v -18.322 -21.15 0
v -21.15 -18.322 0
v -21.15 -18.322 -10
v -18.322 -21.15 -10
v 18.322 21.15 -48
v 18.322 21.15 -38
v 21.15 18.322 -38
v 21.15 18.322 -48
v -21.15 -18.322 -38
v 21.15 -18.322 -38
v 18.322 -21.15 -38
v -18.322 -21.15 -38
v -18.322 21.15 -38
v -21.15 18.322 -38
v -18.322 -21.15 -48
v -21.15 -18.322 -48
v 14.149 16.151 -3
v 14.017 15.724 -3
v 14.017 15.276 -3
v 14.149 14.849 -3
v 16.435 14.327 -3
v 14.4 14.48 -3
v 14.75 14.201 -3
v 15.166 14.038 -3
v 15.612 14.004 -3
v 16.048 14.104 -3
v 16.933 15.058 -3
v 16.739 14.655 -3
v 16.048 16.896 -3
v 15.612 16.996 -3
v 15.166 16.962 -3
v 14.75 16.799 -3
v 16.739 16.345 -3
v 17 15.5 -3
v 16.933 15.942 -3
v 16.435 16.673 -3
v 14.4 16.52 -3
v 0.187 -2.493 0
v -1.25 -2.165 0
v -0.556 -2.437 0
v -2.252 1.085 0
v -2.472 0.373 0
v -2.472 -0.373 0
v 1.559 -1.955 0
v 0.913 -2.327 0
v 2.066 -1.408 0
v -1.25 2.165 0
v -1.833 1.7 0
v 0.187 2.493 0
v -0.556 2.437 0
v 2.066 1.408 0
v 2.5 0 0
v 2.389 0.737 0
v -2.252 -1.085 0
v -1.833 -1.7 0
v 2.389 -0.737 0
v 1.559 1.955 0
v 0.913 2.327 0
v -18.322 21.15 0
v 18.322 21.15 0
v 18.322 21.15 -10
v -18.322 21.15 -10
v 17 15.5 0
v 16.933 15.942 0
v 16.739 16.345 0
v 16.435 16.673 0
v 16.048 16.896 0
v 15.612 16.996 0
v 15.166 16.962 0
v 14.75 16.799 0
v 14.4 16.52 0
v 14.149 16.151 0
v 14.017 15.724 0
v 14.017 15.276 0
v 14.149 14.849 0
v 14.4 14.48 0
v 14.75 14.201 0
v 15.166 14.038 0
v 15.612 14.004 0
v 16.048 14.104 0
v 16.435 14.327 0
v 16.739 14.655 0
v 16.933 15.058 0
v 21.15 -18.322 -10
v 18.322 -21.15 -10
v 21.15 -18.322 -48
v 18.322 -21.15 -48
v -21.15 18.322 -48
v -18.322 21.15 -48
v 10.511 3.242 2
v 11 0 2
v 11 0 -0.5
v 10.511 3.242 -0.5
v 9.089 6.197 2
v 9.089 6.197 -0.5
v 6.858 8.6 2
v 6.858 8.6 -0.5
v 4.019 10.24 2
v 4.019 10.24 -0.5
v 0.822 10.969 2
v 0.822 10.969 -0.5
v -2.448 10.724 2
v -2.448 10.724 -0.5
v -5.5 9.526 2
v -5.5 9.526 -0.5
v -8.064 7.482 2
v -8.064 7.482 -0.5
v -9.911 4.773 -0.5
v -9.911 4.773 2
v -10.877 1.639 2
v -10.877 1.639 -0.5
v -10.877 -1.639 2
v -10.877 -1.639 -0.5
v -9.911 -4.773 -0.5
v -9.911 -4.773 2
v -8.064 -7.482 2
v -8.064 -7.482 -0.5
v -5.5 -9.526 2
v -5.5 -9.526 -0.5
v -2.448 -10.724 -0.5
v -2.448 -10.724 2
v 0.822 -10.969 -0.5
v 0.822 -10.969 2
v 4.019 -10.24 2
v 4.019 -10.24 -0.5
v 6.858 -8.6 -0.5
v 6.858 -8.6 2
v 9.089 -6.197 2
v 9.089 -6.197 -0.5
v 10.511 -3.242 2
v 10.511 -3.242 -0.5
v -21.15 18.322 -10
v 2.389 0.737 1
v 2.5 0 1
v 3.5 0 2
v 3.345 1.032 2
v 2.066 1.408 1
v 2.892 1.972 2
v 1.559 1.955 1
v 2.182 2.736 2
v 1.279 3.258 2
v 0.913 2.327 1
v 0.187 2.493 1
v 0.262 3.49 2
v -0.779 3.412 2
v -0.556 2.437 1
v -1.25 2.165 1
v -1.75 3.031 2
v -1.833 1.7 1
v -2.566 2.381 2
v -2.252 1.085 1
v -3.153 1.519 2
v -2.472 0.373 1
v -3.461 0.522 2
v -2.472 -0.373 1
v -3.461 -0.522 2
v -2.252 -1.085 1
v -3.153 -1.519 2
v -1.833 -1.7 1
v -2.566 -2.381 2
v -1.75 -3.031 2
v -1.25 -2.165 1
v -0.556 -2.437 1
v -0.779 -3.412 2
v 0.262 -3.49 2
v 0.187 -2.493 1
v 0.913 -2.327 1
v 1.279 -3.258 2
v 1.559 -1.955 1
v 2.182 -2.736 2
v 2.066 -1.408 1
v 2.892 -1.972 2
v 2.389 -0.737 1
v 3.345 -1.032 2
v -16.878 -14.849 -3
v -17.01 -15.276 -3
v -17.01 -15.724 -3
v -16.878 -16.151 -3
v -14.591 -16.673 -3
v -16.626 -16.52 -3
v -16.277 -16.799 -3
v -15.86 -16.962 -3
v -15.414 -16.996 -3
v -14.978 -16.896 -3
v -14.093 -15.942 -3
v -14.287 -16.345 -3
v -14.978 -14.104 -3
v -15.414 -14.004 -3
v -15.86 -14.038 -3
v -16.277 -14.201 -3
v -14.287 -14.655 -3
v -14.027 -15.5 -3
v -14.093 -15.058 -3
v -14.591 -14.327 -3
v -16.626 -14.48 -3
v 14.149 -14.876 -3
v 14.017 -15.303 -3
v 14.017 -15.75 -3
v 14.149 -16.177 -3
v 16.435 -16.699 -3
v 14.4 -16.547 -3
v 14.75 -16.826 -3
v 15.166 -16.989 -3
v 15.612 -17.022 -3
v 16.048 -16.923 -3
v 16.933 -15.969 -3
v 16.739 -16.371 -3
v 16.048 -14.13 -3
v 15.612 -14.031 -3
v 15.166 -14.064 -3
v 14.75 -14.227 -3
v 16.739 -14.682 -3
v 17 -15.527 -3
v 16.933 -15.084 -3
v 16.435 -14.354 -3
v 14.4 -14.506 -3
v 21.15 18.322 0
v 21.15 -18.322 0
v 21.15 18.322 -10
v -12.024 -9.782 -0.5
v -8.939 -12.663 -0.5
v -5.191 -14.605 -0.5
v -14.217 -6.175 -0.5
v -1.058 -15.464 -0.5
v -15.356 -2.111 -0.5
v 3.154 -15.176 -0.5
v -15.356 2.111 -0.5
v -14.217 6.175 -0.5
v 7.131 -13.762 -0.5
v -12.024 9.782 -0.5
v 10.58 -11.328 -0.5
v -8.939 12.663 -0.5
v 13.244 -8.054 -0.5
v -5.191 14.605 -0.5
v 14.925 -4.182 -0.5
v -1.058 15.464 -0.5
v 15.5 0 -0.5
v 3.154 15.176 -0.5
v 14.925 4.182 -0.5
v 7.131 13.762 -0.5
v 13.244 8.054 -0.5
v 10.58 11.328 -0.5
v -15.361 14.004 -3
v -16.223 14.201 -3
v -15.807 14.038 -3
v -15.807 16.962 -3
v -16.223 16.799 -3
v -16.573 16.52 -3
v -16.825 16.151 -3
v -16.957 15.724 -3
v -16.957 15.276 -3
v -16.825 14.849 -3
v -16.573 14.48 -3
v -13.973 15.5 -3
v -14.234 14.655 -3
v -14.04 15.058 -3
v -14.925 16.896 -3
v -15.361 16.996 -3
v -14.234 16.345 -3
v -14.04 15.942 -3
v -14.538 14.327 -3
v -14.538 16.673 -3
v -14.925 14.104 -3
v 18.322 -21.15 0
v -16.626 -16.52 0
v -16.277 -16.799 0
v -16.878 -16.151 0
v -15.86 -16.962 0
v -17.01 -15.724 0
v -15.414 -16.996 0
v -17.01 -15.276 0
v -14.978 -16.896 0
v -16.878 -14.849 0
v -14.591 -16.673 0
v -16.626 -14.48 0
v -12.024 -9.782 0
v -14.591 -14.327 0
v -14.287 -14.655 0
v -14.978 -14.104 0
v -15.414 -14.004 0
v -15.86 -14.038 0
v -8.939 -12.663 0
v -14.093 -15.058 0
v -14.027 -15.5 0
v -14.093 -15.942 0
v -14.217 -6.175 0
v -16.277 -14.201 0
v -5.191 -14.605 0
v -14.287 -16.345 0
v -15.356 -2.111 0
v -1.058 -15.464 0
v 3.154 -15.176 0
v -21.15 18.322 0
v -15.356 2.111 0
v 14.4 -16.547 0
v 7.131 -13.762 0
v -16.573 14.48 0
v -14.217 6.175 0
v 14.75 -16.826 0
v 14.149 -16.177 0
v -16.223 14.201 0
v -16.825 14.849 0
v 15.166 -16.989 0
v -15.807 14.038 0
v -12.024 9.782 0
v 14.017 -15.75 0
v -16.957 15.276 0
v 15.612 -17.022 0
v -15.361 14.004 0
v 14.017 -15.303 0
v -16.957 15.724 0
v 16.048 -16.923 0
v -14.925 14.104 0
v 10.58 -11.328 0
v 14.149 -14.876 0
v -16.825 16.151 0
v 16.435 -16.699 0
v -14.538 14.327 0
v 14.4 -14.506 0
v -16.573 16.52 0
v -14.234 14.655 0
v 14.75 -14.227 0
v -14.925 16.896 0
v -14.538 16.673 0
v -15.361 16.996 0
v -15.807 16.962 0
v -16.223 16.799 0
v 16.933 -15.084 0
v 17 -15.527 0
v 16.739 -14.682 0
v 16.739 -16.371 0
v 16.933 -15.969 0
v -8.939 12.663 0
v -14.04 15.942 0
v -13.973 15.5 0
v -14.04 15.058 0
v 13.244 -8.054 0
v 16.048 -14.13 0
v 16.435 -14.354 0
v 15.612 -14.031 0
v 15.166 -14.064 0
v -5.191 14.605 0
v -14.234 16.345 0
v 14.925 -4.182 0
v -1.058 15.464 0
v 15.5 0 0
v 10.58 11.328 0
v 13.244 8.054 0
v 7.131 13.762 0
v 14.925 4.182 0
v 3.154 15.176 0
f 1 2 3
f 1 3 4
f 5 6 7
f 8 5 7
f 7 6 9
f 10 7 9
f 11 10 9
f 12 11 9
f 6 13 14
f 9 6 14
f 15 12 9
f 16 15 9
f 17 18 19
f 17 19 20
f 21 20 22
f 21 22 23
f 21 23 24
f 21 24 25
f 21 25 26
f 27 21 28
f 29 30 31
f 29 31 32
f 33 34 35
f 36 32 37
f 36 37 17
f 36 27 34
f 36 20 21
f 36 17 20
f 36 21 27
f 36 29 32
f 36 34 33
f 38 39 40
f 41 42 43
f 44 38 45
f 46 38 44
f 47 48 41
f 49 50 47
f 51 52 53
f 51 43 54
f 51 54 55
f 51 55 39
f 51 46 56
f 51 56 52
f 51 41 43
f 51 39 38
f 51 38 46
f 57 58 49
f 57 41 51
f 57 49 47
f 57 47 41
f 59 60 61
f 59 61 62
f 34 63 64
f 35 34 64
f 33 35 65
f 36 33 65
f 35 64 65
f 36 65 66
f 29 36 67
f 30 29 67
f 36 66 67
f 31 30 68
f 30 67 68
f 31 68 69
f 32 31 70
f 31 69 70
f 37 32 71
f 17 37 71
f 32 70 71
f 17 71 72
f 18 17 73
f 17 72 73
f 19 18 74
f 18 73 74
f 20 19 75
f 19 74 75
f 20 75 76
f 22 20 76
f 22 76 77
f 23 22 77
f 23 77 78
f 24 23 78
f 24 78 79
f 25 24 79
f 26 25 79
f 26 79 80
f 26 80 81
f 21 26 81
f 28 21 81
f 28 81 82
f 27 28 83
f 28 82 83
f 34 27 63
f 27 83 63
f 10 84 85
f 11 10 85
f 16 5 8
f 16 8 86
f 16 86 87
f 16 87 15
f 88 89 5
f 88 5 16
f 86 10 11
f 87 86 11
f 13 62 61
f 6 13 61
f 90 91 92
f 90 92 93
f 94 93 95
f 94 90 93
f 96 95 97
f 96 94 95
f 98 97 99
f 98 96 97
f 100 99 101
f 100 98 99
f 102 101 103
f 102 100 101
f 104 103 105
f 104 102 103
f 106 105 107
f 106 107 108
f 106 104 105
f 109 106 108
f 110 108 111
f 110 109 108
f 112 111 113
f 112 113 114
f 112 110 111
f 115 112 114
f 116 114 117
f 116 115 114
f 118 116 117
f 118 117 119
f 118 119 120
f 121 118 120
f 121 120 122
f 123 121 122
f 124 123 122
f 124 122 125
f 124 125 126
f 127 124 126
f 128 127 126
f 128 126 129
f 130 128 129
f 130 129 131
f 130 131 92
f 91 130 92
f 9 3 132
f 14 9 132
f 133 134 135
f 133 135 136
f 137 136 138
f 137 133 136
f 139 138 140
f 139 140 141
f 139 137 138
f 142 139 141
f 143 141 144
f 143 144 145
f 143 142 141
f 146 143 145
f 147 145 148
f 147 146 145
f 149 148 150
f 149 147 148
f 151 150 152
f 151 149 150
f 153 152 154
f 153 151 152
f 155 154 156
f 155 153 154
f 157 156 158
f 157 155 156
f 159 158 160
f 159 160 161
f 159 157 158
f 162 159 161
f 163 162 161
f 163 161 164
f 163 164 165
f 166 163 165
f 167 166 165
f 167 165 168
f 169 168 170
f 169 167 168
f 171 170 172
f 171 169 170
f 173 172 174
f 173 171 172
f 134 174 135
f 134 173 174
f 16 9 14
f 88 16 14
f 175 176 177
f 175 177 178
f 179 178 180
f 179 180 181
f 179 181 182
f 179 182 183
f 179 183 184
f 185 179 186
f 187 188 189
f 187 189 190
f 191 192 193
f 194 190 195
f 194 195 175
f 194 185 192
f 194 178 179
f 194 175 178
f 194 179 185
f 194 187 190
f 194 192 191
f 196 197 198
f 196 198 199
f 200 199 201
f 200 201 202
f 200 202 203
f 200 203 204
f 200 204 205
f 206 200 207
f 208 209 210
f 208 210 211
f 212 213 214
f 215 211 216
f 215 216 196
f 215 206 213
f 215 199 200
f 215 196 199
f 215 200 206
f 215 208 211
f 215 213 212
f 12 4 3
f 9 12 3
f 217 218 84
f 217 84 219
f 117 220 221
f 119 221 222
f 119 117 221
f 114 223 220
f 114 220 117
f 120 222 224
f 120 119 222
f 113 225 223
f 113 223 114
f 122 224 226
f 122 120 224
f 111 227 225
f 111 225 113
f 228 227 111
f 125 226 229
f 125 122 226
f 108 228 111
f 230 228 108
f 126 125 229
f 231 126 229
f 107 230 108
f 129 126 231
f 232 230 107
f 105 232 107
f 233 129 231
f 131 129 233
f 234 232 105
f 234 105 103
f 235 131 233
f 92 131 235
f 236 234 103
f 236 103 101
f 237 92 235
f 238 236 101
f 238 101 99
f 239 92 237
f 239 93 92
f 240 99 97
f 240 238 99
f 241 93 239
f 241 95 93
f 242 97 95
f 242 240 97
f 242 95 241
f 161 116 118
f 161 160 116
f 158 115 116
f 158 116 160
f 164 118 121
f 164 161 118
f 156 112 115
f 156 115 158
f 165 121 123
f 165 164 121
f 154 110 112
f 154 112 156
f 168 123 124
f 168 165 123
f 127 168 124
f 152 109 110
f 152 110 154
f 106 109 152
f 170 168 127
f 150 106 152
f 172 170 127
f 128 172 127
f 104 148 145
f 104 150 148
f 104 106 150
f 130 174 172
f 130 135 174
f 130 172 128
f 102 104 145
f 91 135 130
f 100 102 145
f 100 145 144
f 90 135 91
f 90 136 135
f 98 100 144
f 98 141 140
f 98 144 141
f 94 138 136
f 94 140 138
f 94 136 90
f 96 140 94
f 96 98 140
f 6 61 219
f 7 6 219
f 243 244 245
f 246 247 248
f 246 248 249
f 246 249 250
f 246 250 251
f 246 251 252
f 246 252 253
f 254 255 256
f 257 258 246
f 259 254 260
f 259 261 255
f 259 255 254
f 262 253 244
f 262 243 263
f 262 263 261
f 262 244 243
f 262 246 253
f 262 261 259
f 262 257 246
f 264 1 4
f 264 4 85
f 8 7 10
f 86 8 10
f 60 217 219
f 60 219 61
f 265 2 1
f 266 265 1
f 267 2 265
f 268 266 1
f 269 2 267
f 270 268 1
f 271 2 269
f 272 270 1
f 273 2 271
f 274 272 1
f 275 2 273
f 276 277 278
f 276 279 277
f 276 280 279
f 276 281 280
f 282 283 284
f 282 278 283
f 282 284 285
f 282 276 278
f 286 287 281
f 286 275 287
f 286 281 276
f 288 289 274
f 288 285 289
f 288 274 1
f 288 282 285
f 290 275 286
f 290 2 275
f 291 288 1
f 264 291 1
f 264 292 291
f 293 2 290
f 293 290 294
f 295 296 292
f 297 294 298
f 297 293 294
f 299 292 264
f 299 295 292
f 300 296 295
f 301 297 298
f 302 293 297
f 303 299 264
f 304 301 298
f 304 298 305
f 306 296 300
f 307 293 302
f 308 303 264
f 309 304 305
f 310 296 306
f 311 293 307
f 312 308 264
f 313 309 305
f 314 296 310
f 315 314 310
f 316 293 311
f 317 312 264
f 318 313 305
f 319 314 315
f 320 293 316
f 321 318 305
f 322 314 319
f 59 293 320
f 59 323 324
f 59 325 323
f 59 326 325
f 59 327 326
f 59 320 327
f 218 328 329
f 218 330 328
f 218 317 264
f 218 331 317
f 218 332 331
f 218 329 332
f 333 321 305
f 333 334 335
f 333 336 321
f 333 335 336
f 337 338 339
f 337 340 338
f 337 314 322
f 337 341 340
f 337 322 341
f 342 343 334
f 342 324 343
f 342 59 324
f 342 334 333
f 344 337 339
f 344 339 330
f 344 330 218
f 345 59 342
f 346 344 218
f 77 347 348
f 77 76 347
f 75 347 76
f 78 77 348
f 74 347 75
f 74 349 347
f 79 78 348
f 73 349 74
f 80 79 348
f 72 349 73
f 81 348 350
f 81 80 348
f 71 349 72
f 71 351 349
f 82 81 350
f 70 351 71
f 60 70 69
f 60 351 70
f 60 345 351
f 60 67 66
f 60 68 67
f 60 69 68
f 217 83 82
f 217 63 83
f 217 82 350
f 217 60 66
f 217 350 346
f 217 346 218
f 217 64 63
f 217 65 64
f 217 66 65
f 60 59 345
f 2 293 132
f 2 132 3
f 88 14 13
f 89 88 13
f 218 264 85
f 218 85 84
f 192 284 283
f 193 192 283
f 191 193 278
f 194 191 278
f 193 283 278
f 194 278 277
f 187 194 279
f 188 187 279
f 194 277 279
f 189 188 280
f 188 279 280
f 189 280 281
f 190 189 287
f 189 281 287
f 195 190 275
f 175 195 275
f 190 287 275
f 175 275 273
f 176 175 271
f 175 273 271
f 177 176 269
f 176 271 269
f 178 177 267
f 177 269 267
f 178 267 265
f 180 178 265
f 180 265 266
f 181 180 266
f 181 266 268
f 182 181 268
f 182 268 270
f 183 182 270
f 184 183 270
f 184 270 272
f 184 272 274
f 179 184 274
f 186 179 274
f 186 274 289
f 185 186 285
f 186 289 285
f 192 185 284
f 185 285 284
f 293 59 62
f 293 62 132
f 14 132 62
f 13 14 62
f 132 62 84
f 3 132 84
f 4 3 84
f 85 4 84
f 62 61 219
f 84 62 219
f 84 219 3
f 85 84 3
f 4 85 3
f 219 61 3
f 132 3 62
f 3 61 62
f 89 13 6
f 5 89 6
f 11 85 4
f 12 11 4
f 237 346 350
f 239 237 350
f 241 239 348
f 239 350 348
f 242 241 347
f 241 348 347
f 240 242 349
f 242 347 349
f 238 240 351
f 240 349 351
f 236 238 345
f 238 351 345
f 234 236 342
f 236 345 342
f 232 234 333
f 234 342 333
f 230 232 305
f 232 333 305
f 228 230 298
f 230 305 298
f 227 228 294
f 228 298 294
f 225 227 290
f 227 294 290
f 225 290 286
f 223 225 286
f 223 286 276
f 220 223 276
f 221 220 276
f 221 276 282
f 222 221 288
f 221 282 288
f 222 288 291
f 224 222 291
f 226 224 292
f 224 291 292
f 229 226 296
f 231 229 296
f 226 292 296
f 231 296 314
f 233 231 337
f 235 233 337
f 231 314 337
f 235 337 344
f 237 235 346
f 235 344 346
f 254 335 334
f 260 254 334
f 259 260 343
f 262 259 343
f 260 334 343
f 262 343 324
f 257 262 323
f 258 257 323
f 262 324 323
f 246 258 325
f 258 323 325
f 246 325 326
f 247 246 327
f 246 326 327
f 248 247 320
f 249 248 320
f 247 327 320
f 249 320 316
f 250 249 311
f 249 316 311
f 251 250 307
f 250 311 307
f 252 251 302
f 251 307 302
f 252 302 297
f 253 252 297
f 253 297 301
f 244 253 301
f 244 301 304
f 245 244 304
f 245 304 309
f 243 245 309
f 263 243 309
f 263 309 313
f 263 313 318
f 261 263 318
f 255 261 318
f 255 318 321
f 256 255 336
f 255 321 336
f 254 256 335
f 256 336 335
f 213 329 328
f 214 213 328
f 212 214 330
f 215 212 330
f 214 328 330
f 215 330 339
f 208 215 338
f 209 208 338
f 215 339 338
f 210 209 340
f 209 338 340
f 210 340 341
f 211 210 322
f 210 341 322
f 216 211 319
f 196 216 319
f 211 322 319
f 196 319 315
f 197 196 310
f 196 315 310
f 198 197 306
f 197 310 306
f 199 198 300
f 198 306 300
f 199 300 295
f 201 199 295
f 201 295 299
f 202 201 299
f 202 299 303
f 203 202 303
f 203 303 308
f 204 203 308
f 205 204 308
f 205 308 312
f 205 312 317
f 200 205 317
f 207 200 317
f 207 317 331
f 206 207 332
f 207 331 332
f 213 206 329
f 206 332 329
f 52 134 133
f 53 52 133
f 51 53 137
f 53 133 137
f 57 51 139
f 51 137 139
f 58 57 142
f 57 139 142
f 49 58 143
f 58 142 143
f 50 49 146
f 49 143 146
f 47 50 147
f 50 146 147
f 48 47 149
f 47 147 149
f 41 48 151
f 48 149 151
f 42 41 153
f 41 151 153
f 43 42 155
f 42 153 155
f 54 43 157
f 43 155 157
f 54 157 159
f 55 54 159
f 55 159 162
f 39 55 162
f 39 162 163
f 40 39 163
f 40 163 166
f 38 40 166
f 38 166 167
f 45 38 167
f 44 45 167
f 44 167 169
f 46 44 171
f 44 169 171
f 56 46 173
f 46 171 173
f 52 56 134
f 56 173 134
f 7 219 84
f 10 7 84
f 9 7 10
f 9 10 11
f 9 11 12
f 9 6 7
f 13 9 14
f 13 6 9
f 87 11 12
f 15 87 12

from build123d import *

# Parameters (mm, degrees)
EXTRUDE_1_DEPTH     = 10
EXTRUDE_2_DEPTH     = 28
EXTRUDE_3_DEPTH     = 10
SKETCH_1_3_R        = 15.5
SKETCH_1_3_R_2      = 11
CUT_EXTRUDE_1_DEPTH = 0.5
EXTRUDE_START       = 2
SKETCH_1_4_R        = 11
SKETCH_1_4_R_2      = 2.5
EXTRUDE_4_DEPTH     = 2
CHAMFER_1_SIZE      = 1
SKETCH_5_R          = 1.5
CUT_EXTRUDE_3_DEPTH = 3


with BuildPart() as part:
    # 草图1 → 凸台-拉伸1 (new body)
    with BuildSketch(Plane.XY):
        Polygon((21.15, 18.321572875), (18.321572875, 21.15), (-18.321572875, 21.15), (-21.15, 18.321572875), (-21.15, -18.321572875), (-18.321572875, -21.15), (18.321572875, -21.15), (21.15, -18.321572875), align=None)
    extrude(amount=-EXTRUDE_1_DEPTH)

    # 草图1<3> → 切除-拉伸1 (cut)
    with BuildSketch(Plane.XY):
        Circle(SKETCH_1_3_R)
        Circle(SKETCH_1_3_R_2, mode=Mode.SUBTRACT)
    extrude(amount=-CUT_EXTRUDE_1_DEPTH, mode=Mode.SUBTRACT)

    # 草图1<4> → 凸台-拉伸4 (add)
    with BuildSketch(Plane.XY.offset(EXTRUDE_START)):
        Circle(SKETCH_1_4_R)
        Circle(SKETCH_1_4_R_2, mode=Mode.SUBTRACT)
    extrude(amount=-EXTRUDE_4_DEPTH)

    # 倒角1
    chamfer_1_edges = [part.edges().sort_by_distance(p)[0] for p in [
        (-2.5, 0, 2),
    ]]
    chamfer(chamfer_1_edges, length=CHAMFER_1_SIZE)

    # 草图5 → 切除-拉伸3 (cut)
    with BuildSketch(Plane.XY):
        with Locations((-15.473447232, 15.499954591)):
            Circle(SKETCH_5_R)
        with Locations((15.5, 15.5)):
            Circle(SKETCH_5_R)
        with Locations((15.5, -15.526507359)):
            Circle(SKETCH_5_R)
        with Locations((-15.526507359, -15.5)):
            Circle(SKETCH_5_R)
    extrude(amount=-CUT_EXTRUDE_3_DEPTH, mode=Mode.SUBTRACT)


with BuildPart() as body_2:
    # 草图2 → 凸台-拉伸2 (new body)
    with BuildSketch(Plane(origin=(0, 0, -10), x_dir=(-1, 0, 0), z_dir=(0, 0, -1))):
        Polygon((-21.15, 18.321572875), (-21.15, -18.321572875), (-18.321572875, -21.15), (18.321572875, -21.15), (21.15, -18.321572875), (21.15, 18.321572875), (18.321572875, 21.15), (-18.321572875, 21.15), align=None)
    extrude(amount=EXTRUDE_2_DEPTH)


with BuildPart() as body_3:
    # 草图3 → 凸台-拉伸3 (new body)
    with BuildSketch(Plane(origin=(0, 0, -38), x_dir=(-1, 0, 0), z_dir=(0, 0, -1))):
        Polygon((-18.321572875, 21.15), (-21.15, 18.321572875), (-21.15, -18.321572875), (-18.321572875, -21.15), (18.321572875, -21.15), (21.15, -18.321572875), (21.15, 18.321572875), (18.321572875, 21.15), align=None)
    extrude(amount=EXTRUDE_3_DEPTH)


solid = Compound([part.part, body_2.part, body_3.part])
